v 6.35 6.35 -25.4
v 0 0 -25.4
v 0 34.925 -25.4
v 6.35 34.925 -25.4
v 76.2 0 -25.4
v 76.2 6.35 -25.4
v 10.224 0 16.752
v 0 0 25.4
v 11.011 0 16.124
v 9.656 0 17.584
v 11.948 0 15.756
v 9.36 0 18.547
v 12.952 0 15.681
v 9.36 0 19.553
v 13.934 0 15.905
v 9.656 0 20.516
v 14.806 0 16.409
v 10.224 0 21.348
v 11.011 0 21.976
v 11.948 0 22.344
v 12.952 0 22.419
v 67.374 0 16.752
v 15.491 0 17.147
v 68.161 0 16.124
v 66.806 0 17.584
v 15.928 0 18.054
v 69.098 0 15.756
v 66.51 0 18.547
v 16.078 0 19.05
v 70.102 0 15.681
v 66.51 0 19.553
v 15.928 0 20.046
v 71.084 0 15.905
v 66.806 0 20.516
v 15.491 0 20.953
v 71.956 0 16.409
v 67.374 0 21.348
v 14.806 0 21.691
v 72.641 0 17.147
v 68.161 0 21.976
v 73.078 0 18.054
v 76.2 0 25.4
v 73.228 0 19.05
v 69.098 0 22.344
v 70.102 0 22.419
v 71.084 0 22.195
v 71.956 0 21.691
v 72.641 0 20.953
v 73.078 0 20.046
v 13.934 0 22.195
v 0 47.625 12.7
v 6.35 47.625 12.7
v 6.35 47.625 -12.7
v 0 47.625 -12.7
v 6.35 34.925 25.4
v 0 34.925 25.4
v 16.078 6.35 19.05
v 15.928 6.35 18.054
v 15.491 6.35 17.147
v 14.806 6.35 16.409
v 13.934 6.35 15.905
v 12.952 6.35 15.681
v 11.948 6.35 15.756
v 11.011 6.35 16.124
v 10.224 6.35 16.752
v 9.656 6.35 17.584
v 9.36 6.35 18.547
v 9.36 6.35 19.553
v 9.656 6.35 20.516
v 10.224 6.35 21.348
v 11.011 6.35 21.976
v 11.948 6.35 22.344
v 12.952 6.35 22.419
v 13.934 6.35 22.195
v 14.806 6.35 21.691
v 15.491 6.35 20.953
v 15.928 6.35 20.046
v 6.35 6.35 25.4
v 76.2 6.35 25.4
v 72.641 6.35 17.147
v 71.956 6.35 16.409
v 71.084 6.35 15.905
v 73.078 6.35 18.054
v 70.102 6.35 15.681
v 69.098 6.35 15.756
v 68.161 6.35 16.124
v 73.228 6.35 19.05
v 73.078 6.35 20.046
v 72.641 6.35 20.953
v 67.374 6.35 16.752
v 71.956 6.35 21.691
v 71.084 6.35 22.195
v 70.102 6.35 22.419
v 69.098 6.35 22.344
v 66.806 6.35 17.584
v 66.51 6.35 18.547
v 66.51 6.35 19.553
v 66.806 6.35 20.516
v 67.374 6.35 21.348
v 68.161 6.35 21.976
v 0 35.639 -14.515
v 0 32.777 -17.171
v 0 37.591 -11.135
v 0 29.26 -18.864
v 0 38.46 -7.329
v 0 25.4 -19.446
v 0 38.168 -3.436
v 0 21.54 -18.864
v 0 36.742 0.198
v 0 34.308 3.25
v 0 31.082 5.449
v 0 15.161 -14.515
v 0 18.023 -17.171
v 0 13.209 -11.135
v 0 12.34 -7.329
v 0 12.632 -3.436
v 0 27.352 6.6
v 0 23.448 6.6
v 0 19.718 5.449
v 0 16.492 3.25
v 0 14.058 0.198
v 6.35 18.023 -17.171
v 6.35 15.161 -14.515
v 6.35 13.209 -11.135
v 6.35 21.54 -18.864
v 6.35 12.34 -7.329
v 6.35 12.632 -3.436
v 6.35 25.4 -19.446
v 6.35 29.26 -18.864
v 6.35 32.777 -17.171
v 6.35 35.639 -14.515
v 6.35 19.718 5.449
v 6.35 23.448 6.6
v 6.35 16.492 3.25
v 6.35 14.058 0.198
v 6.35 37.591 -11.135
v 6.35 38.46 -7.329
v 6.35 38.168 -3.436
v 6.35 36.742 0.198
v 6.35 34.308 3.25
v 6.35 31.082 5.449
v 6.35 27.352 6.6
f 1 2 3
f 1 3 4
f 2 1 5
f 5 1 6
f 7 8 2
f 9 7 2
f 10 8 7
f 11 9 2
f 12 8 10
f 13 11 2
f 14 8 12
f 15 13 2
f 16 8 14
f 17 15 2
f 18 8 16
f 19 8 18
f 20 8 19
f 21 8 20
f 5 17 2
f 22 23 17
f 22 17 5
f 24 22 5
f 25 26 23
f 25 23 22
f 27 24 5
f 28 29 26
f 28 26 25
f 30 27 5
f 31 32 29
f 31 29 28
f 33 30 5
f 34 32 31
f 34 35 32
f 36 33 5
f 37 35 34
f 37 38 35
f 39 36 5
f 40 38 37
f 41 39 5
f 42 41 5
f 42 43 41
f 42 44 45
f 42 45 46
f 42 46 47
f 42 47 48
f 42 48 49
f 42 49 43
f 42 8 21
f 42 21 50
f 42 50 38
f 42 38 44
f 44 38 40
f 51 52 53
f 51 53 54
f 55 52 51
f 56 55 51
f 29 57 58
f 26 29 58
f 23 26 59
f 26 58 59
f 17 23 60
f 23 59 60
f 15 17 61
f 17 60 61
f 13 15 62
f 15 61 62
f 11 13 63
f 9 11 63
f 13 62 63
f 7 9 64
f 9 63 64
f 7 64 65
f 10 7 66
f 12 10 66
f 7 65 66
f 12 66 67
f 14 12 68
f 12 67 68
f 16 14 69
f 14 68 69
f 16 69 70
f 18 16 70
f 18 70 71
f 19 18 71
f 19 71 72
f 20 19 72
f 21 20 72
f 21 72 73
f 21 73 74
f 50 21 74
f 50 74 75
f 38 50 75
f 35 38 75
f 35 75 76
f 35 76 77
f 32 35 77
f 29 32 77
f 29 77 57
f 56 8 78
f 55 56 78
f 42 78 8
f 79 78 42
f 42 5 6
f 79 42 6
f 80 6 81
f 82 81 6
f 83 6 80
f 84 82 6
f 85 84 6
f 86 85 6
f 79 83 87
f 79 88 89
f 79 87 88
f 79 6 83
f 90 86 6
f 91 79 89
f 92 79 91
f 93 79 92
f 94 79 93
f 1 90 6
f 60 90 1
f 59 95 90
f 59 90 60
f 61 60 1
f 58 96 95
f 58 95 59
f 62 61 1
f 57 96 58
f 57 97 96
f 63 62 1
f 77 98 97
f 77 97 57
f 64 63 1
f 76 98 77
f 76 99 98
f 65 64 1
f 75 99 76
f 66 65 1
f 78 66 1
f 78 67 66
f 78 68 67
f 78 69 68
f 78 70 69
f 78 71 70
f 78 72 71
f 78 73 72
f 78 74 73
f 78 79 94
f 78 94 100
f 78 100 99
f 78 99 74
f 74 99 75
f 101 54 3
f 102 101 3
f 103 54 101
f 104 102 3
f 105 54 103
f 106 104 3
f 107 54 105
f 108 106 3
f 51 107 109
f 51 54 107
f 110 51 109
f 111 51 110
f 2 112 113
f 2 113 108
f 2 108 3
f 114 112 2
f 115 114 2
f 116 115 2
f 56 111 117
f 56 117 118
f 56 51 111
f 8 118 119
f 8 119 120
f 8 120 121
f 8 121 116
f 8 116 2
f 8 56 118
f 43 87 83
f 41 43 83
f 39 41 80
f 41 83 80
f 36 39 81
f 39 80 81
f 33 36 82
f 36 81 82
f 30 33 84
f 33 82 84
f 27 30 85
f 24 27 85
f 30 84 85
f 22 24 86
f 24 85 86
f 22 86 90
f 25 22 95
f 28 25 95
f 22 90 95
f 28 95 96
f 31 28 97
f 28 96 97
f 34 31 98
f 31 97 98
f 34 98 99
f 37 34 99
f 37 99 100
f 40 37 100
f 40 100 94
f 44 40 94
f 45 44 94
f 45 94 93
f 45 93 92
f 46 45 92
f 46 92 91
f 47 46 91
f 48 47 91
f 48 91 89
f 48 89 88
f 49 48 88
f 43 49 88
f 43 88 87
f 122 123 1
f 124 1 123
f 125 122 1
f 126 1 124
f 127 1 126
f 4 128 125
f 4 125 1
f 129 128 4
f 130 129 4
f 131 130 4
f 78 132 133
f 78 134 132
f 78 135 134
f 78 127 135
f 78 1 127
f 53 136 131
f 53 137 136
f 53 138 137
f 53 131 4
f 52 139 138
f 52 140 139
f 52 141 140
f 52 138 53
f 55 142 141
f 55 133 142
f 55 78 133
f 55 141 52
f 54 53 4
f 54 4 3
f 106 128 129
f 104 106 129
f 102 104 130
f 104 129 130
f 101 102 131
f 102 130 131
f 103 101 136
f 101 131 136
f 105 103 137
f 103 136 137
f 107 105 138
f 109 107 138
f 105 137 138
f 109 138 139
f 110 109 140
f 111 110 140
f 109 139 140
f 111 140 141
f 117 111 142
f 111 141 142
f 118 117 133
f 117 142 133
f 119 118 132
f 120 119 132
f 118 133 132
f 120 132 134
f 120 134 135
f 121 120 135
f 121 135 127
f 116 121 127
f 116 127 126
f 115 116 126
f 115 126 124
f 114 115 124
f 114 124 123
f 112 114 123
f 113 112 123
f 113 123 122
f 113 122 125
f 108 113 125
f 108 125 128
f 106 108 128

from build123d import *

# Parameters (mm, degrees)
BOSS_EXTRUDE1_DEPTH     = 25.4
F_1_4_CLEARANCE_HOLE1_D = 6.7564
F_1_CLEARANCE_HOLE1_D   = 26.19248
CHAMFER1_SIZE           = 12.7


with BuildPart() as part:
    # Sketch1 → Boss-Extrude1 (new, symmetric)
    with BuildSketch(Plane.XY):
        Polygon((0, 0), (76.2, 0), (76.2, 6.35), (6.35, 6.35), (6.35, 47.625), (0, 47.625), align=None)
    extrude(amount=BOSS_EXTRUDE1_DEPTH, both=True)

    # 1/4 Clearance Hole1 (through all)
    with Locations(Plane(origin=(0, 0, 0), x_dir=(-1, 0, 0), z_dir=(0, -1, 0))):
        with Locations((-12.7, -19.05), (-69.85, -19.05)):
            Hole(F_1_4_CLEARANCE_HOLE1_D / 2)

    # 1 Clearance Hole1 (through all)
    with Locations(Plane.ZY):
        with Locations((-6.35, 25.4)):
            Hole(F_1_CLEARANCE_HOLE1_D / 2)

    # Chamfer1
    chamfer1_edges = [part.edges().sort_by_distance(p)[0] for p in [
        (3.175, 47.625, 25.4),
        (3.175, 47.625, -25.4),
    ]]
    chamfer(chamfer1_edges, length=CHAMFER1_SIZE)


solid = part.part
